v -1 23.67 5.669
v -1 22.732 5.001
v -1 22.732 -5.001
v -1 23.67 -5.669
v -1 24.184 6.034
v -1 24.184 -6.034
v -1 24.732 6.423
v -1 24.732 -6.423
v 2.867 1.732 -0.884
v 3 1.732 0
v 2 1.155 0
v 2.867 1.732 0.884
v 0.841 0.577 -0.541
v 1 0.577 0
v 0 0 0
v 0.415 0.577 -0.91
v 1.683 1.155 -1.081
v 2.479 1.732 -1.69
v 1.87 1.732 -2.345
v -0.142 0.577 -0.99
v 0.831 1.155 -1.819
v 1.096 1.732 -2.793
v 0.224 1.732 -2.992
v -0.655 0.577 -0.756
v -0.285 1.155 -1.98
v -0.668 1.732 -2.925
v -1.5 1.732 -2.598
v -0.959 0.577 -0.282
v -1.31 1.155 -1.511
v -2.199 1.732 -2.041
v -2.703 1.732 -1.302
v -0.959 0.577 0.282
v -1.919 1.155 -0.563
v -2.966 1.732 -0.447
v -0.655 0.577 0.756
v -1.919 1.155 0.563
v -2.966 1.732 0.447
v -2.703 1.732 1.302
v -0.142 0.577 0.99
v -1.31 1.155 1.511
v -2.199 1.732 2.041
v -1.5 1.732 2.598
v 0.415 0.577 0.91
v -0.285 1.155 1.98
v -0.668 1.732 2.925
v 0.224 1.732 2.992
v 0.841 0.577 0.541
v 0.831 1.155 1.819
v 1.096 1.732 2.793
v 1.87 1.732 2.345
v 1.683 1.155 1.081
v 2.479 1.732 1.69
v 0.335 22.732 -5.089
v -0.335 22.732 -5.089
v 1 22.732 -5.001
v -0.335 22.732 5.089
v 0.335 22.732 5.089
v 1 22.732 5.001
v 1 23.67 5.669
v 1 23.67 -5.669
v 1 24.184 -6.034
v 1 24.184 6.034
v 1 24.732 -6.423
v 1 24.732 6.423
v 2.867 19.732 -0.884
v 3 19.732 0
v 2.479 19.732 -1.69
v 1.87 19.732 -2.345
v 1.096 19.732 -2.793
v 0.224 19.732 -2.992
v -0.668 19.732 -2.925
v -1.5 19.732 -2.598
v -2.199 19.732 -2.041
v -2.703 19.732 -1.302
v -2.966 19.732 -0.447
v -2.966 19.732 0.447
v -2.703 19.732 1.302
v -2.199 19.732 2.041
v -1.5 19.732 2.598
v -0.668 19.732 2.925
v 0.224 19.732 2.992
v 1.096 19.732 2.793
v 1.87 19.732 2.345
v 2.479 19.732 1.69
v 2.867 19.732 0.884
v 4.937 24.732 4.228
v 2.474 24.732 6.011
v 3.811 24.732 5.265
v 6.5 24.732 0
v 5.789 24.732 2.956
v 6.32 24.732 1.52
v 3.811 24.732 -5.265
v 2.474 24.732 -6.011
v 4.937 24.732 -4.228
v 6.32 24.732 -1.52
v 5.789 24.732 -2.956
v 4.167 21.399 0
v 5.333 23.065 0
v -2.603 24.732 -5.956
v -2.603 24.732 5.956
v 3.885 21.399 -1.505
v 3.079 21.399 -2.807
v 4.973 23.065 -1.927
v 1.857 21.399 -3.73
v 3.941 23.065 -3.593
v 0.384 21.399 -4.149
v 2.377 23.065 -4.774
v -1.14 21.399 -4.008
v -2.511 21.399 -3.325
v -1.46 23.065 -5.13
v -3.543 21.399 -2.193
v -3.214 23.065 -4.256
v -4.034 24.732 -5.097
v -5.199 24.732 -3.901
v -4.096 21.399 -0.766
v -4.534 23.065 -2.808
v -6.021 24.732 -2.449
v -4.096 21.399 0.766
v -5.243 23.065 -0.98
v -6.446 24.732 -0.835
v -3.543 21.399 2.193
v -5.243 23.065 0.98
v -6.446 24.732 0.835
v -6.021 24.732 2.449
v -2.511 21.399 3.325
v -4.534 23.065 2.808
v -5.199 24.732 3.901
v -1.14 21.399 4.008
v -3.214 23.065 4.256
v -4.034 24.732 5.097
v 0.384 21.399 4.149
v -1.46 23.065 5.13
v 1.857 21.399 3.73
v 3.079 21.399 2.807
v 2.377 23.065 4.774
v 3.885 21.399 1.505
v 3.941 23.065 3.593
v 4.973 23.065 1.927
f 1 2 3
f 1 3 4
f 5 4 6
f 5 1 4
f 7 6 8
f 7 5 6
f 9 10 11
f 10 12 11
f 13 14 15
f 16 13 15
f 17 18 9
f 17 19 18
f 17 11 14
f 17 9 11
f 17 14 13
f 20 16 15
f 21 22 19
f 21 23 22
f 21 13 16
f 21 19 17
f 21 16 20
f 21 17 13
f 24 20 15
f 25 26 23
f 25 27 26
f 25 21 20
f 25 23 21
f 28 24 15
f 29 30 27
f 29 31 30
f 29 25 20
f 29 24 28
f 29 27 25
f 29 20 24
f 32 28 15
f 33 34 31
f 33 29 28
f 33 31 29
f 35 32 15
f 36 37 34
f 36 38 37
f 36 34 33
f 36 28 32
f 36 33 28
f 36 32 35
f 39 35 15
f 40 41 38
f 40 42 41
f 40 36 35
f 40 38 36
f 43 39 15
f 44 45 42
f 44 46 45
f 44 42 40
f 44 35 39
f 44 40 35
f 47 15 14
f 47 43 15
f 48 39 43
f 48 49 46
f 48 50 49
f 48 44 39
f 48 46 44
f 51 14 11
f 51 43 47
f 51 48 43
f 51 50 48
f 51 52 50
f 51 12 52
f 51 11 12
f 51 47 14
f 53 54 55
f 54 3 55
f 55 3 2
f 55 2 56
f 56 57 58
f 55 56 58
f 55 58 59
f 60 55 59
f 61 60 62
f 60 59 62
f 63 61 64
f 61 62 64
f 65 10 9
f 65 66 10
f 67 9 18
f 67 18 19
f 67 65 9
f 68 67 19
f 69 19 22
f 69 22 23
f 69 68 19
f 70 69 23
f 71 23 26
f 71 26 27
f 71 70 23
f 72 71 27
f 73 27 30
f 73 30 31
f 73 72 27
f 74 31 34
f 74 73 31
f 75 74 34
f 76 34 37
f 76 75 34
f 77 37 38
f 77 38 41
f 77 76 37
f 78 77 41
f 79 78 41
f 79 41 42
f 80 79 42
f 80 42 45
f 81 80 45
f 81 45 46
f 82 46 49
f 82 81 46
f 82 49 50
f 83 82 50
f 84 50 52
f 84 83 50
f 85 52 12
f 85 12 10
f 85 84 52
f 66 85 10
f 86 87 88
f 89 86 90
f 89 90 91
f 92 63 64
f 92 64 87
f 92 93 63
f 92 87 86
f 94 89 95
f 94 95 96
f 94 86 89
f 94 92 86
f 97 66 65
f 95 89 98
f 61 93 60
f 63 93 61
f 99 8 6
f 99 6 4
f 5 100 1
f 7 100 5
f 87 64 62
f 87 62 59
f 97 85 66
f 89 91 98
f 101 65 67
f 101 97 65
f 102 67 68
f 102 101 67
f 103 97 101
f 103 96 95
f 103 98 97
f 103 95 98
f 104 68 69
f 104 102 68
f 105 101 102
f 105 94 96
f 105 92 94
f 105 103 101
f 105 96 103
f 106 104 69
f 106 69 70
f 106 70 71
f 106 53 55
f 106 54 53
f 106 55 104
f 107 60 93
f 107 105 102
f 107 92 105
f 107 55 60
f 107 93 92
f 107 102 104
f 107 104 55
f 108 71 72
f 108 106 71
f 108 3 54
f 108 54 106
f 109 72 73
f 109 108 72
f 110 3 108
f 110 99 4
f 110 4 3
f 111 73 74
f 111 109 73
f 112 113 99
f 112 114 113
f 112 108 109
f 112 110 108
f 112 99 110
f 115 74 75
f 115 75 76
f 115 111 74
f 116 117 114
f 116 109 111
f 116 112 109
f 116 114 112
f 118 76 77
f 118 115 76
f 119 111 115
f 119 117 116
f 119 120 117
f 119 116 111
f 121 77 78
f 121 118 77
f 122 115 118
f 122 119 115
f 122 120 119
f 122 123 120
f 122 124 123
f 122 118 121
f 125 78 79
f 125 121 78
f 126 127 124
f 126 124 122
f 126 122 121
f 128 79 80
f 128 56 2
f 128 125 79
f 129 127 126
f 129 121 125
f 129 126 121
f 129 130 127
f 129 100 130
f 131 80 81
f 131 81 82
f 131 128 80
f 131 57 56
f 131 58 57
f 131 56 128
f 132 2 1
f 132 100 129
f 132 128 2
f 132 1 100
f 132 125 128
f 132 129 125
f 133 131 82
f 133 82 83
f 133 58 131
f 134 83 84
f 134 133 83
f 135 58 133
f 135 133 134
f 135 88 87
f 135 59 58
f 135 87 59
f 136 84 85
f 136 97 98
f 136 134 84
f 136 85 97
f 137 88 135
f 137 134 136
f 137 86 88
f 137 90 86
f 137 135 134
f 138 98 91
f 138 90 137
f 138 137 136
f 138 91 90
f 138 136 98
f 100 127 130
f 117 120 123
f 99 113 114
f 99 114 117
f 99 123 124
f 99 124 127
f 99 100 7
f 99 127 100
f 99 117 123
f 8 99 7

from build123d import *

# Parameters (mm, degrees)
SKETCH4_W               = 2
SKETCH4_H               = 3
CUT_EXTRUDE1_DEPTH      = 7.5
CUT_EXTRUDE1_DEPTH_BACK = 7.5


with BuildPart() as part:
    # Sketch3 → Revolve1 (revolve)
    with BuildSketch(Plane.XY):
        Polygon((0, 0), (3, 1.732050808), (3, 19.732050808), (6.5, 24.732050808), (0, 24.732050808), align=None)
    revolve(axis=Axis((0, -8.000817712, 0), (0, 1, 0)))

    # Sketch4 → Cut-Extrude1 (cut, two sides)
    with BuildSketch(Plane.XY) as cut_extrude1_sk:
        with Locations((0, 24.232050808)):
            Rectangle(SKETCH4_W, SKETCH4_H)
    extrude(amount=CUT_EXTRUDE1_DEPTH, mode=Mode.SUBTRACT)
    extrude(cut_extrude1_sk.sketch, amount=-CUT_EXTRUDE1_DEPTH_BACK, mode=Mode.SUBTRACT)


solid = part.part
